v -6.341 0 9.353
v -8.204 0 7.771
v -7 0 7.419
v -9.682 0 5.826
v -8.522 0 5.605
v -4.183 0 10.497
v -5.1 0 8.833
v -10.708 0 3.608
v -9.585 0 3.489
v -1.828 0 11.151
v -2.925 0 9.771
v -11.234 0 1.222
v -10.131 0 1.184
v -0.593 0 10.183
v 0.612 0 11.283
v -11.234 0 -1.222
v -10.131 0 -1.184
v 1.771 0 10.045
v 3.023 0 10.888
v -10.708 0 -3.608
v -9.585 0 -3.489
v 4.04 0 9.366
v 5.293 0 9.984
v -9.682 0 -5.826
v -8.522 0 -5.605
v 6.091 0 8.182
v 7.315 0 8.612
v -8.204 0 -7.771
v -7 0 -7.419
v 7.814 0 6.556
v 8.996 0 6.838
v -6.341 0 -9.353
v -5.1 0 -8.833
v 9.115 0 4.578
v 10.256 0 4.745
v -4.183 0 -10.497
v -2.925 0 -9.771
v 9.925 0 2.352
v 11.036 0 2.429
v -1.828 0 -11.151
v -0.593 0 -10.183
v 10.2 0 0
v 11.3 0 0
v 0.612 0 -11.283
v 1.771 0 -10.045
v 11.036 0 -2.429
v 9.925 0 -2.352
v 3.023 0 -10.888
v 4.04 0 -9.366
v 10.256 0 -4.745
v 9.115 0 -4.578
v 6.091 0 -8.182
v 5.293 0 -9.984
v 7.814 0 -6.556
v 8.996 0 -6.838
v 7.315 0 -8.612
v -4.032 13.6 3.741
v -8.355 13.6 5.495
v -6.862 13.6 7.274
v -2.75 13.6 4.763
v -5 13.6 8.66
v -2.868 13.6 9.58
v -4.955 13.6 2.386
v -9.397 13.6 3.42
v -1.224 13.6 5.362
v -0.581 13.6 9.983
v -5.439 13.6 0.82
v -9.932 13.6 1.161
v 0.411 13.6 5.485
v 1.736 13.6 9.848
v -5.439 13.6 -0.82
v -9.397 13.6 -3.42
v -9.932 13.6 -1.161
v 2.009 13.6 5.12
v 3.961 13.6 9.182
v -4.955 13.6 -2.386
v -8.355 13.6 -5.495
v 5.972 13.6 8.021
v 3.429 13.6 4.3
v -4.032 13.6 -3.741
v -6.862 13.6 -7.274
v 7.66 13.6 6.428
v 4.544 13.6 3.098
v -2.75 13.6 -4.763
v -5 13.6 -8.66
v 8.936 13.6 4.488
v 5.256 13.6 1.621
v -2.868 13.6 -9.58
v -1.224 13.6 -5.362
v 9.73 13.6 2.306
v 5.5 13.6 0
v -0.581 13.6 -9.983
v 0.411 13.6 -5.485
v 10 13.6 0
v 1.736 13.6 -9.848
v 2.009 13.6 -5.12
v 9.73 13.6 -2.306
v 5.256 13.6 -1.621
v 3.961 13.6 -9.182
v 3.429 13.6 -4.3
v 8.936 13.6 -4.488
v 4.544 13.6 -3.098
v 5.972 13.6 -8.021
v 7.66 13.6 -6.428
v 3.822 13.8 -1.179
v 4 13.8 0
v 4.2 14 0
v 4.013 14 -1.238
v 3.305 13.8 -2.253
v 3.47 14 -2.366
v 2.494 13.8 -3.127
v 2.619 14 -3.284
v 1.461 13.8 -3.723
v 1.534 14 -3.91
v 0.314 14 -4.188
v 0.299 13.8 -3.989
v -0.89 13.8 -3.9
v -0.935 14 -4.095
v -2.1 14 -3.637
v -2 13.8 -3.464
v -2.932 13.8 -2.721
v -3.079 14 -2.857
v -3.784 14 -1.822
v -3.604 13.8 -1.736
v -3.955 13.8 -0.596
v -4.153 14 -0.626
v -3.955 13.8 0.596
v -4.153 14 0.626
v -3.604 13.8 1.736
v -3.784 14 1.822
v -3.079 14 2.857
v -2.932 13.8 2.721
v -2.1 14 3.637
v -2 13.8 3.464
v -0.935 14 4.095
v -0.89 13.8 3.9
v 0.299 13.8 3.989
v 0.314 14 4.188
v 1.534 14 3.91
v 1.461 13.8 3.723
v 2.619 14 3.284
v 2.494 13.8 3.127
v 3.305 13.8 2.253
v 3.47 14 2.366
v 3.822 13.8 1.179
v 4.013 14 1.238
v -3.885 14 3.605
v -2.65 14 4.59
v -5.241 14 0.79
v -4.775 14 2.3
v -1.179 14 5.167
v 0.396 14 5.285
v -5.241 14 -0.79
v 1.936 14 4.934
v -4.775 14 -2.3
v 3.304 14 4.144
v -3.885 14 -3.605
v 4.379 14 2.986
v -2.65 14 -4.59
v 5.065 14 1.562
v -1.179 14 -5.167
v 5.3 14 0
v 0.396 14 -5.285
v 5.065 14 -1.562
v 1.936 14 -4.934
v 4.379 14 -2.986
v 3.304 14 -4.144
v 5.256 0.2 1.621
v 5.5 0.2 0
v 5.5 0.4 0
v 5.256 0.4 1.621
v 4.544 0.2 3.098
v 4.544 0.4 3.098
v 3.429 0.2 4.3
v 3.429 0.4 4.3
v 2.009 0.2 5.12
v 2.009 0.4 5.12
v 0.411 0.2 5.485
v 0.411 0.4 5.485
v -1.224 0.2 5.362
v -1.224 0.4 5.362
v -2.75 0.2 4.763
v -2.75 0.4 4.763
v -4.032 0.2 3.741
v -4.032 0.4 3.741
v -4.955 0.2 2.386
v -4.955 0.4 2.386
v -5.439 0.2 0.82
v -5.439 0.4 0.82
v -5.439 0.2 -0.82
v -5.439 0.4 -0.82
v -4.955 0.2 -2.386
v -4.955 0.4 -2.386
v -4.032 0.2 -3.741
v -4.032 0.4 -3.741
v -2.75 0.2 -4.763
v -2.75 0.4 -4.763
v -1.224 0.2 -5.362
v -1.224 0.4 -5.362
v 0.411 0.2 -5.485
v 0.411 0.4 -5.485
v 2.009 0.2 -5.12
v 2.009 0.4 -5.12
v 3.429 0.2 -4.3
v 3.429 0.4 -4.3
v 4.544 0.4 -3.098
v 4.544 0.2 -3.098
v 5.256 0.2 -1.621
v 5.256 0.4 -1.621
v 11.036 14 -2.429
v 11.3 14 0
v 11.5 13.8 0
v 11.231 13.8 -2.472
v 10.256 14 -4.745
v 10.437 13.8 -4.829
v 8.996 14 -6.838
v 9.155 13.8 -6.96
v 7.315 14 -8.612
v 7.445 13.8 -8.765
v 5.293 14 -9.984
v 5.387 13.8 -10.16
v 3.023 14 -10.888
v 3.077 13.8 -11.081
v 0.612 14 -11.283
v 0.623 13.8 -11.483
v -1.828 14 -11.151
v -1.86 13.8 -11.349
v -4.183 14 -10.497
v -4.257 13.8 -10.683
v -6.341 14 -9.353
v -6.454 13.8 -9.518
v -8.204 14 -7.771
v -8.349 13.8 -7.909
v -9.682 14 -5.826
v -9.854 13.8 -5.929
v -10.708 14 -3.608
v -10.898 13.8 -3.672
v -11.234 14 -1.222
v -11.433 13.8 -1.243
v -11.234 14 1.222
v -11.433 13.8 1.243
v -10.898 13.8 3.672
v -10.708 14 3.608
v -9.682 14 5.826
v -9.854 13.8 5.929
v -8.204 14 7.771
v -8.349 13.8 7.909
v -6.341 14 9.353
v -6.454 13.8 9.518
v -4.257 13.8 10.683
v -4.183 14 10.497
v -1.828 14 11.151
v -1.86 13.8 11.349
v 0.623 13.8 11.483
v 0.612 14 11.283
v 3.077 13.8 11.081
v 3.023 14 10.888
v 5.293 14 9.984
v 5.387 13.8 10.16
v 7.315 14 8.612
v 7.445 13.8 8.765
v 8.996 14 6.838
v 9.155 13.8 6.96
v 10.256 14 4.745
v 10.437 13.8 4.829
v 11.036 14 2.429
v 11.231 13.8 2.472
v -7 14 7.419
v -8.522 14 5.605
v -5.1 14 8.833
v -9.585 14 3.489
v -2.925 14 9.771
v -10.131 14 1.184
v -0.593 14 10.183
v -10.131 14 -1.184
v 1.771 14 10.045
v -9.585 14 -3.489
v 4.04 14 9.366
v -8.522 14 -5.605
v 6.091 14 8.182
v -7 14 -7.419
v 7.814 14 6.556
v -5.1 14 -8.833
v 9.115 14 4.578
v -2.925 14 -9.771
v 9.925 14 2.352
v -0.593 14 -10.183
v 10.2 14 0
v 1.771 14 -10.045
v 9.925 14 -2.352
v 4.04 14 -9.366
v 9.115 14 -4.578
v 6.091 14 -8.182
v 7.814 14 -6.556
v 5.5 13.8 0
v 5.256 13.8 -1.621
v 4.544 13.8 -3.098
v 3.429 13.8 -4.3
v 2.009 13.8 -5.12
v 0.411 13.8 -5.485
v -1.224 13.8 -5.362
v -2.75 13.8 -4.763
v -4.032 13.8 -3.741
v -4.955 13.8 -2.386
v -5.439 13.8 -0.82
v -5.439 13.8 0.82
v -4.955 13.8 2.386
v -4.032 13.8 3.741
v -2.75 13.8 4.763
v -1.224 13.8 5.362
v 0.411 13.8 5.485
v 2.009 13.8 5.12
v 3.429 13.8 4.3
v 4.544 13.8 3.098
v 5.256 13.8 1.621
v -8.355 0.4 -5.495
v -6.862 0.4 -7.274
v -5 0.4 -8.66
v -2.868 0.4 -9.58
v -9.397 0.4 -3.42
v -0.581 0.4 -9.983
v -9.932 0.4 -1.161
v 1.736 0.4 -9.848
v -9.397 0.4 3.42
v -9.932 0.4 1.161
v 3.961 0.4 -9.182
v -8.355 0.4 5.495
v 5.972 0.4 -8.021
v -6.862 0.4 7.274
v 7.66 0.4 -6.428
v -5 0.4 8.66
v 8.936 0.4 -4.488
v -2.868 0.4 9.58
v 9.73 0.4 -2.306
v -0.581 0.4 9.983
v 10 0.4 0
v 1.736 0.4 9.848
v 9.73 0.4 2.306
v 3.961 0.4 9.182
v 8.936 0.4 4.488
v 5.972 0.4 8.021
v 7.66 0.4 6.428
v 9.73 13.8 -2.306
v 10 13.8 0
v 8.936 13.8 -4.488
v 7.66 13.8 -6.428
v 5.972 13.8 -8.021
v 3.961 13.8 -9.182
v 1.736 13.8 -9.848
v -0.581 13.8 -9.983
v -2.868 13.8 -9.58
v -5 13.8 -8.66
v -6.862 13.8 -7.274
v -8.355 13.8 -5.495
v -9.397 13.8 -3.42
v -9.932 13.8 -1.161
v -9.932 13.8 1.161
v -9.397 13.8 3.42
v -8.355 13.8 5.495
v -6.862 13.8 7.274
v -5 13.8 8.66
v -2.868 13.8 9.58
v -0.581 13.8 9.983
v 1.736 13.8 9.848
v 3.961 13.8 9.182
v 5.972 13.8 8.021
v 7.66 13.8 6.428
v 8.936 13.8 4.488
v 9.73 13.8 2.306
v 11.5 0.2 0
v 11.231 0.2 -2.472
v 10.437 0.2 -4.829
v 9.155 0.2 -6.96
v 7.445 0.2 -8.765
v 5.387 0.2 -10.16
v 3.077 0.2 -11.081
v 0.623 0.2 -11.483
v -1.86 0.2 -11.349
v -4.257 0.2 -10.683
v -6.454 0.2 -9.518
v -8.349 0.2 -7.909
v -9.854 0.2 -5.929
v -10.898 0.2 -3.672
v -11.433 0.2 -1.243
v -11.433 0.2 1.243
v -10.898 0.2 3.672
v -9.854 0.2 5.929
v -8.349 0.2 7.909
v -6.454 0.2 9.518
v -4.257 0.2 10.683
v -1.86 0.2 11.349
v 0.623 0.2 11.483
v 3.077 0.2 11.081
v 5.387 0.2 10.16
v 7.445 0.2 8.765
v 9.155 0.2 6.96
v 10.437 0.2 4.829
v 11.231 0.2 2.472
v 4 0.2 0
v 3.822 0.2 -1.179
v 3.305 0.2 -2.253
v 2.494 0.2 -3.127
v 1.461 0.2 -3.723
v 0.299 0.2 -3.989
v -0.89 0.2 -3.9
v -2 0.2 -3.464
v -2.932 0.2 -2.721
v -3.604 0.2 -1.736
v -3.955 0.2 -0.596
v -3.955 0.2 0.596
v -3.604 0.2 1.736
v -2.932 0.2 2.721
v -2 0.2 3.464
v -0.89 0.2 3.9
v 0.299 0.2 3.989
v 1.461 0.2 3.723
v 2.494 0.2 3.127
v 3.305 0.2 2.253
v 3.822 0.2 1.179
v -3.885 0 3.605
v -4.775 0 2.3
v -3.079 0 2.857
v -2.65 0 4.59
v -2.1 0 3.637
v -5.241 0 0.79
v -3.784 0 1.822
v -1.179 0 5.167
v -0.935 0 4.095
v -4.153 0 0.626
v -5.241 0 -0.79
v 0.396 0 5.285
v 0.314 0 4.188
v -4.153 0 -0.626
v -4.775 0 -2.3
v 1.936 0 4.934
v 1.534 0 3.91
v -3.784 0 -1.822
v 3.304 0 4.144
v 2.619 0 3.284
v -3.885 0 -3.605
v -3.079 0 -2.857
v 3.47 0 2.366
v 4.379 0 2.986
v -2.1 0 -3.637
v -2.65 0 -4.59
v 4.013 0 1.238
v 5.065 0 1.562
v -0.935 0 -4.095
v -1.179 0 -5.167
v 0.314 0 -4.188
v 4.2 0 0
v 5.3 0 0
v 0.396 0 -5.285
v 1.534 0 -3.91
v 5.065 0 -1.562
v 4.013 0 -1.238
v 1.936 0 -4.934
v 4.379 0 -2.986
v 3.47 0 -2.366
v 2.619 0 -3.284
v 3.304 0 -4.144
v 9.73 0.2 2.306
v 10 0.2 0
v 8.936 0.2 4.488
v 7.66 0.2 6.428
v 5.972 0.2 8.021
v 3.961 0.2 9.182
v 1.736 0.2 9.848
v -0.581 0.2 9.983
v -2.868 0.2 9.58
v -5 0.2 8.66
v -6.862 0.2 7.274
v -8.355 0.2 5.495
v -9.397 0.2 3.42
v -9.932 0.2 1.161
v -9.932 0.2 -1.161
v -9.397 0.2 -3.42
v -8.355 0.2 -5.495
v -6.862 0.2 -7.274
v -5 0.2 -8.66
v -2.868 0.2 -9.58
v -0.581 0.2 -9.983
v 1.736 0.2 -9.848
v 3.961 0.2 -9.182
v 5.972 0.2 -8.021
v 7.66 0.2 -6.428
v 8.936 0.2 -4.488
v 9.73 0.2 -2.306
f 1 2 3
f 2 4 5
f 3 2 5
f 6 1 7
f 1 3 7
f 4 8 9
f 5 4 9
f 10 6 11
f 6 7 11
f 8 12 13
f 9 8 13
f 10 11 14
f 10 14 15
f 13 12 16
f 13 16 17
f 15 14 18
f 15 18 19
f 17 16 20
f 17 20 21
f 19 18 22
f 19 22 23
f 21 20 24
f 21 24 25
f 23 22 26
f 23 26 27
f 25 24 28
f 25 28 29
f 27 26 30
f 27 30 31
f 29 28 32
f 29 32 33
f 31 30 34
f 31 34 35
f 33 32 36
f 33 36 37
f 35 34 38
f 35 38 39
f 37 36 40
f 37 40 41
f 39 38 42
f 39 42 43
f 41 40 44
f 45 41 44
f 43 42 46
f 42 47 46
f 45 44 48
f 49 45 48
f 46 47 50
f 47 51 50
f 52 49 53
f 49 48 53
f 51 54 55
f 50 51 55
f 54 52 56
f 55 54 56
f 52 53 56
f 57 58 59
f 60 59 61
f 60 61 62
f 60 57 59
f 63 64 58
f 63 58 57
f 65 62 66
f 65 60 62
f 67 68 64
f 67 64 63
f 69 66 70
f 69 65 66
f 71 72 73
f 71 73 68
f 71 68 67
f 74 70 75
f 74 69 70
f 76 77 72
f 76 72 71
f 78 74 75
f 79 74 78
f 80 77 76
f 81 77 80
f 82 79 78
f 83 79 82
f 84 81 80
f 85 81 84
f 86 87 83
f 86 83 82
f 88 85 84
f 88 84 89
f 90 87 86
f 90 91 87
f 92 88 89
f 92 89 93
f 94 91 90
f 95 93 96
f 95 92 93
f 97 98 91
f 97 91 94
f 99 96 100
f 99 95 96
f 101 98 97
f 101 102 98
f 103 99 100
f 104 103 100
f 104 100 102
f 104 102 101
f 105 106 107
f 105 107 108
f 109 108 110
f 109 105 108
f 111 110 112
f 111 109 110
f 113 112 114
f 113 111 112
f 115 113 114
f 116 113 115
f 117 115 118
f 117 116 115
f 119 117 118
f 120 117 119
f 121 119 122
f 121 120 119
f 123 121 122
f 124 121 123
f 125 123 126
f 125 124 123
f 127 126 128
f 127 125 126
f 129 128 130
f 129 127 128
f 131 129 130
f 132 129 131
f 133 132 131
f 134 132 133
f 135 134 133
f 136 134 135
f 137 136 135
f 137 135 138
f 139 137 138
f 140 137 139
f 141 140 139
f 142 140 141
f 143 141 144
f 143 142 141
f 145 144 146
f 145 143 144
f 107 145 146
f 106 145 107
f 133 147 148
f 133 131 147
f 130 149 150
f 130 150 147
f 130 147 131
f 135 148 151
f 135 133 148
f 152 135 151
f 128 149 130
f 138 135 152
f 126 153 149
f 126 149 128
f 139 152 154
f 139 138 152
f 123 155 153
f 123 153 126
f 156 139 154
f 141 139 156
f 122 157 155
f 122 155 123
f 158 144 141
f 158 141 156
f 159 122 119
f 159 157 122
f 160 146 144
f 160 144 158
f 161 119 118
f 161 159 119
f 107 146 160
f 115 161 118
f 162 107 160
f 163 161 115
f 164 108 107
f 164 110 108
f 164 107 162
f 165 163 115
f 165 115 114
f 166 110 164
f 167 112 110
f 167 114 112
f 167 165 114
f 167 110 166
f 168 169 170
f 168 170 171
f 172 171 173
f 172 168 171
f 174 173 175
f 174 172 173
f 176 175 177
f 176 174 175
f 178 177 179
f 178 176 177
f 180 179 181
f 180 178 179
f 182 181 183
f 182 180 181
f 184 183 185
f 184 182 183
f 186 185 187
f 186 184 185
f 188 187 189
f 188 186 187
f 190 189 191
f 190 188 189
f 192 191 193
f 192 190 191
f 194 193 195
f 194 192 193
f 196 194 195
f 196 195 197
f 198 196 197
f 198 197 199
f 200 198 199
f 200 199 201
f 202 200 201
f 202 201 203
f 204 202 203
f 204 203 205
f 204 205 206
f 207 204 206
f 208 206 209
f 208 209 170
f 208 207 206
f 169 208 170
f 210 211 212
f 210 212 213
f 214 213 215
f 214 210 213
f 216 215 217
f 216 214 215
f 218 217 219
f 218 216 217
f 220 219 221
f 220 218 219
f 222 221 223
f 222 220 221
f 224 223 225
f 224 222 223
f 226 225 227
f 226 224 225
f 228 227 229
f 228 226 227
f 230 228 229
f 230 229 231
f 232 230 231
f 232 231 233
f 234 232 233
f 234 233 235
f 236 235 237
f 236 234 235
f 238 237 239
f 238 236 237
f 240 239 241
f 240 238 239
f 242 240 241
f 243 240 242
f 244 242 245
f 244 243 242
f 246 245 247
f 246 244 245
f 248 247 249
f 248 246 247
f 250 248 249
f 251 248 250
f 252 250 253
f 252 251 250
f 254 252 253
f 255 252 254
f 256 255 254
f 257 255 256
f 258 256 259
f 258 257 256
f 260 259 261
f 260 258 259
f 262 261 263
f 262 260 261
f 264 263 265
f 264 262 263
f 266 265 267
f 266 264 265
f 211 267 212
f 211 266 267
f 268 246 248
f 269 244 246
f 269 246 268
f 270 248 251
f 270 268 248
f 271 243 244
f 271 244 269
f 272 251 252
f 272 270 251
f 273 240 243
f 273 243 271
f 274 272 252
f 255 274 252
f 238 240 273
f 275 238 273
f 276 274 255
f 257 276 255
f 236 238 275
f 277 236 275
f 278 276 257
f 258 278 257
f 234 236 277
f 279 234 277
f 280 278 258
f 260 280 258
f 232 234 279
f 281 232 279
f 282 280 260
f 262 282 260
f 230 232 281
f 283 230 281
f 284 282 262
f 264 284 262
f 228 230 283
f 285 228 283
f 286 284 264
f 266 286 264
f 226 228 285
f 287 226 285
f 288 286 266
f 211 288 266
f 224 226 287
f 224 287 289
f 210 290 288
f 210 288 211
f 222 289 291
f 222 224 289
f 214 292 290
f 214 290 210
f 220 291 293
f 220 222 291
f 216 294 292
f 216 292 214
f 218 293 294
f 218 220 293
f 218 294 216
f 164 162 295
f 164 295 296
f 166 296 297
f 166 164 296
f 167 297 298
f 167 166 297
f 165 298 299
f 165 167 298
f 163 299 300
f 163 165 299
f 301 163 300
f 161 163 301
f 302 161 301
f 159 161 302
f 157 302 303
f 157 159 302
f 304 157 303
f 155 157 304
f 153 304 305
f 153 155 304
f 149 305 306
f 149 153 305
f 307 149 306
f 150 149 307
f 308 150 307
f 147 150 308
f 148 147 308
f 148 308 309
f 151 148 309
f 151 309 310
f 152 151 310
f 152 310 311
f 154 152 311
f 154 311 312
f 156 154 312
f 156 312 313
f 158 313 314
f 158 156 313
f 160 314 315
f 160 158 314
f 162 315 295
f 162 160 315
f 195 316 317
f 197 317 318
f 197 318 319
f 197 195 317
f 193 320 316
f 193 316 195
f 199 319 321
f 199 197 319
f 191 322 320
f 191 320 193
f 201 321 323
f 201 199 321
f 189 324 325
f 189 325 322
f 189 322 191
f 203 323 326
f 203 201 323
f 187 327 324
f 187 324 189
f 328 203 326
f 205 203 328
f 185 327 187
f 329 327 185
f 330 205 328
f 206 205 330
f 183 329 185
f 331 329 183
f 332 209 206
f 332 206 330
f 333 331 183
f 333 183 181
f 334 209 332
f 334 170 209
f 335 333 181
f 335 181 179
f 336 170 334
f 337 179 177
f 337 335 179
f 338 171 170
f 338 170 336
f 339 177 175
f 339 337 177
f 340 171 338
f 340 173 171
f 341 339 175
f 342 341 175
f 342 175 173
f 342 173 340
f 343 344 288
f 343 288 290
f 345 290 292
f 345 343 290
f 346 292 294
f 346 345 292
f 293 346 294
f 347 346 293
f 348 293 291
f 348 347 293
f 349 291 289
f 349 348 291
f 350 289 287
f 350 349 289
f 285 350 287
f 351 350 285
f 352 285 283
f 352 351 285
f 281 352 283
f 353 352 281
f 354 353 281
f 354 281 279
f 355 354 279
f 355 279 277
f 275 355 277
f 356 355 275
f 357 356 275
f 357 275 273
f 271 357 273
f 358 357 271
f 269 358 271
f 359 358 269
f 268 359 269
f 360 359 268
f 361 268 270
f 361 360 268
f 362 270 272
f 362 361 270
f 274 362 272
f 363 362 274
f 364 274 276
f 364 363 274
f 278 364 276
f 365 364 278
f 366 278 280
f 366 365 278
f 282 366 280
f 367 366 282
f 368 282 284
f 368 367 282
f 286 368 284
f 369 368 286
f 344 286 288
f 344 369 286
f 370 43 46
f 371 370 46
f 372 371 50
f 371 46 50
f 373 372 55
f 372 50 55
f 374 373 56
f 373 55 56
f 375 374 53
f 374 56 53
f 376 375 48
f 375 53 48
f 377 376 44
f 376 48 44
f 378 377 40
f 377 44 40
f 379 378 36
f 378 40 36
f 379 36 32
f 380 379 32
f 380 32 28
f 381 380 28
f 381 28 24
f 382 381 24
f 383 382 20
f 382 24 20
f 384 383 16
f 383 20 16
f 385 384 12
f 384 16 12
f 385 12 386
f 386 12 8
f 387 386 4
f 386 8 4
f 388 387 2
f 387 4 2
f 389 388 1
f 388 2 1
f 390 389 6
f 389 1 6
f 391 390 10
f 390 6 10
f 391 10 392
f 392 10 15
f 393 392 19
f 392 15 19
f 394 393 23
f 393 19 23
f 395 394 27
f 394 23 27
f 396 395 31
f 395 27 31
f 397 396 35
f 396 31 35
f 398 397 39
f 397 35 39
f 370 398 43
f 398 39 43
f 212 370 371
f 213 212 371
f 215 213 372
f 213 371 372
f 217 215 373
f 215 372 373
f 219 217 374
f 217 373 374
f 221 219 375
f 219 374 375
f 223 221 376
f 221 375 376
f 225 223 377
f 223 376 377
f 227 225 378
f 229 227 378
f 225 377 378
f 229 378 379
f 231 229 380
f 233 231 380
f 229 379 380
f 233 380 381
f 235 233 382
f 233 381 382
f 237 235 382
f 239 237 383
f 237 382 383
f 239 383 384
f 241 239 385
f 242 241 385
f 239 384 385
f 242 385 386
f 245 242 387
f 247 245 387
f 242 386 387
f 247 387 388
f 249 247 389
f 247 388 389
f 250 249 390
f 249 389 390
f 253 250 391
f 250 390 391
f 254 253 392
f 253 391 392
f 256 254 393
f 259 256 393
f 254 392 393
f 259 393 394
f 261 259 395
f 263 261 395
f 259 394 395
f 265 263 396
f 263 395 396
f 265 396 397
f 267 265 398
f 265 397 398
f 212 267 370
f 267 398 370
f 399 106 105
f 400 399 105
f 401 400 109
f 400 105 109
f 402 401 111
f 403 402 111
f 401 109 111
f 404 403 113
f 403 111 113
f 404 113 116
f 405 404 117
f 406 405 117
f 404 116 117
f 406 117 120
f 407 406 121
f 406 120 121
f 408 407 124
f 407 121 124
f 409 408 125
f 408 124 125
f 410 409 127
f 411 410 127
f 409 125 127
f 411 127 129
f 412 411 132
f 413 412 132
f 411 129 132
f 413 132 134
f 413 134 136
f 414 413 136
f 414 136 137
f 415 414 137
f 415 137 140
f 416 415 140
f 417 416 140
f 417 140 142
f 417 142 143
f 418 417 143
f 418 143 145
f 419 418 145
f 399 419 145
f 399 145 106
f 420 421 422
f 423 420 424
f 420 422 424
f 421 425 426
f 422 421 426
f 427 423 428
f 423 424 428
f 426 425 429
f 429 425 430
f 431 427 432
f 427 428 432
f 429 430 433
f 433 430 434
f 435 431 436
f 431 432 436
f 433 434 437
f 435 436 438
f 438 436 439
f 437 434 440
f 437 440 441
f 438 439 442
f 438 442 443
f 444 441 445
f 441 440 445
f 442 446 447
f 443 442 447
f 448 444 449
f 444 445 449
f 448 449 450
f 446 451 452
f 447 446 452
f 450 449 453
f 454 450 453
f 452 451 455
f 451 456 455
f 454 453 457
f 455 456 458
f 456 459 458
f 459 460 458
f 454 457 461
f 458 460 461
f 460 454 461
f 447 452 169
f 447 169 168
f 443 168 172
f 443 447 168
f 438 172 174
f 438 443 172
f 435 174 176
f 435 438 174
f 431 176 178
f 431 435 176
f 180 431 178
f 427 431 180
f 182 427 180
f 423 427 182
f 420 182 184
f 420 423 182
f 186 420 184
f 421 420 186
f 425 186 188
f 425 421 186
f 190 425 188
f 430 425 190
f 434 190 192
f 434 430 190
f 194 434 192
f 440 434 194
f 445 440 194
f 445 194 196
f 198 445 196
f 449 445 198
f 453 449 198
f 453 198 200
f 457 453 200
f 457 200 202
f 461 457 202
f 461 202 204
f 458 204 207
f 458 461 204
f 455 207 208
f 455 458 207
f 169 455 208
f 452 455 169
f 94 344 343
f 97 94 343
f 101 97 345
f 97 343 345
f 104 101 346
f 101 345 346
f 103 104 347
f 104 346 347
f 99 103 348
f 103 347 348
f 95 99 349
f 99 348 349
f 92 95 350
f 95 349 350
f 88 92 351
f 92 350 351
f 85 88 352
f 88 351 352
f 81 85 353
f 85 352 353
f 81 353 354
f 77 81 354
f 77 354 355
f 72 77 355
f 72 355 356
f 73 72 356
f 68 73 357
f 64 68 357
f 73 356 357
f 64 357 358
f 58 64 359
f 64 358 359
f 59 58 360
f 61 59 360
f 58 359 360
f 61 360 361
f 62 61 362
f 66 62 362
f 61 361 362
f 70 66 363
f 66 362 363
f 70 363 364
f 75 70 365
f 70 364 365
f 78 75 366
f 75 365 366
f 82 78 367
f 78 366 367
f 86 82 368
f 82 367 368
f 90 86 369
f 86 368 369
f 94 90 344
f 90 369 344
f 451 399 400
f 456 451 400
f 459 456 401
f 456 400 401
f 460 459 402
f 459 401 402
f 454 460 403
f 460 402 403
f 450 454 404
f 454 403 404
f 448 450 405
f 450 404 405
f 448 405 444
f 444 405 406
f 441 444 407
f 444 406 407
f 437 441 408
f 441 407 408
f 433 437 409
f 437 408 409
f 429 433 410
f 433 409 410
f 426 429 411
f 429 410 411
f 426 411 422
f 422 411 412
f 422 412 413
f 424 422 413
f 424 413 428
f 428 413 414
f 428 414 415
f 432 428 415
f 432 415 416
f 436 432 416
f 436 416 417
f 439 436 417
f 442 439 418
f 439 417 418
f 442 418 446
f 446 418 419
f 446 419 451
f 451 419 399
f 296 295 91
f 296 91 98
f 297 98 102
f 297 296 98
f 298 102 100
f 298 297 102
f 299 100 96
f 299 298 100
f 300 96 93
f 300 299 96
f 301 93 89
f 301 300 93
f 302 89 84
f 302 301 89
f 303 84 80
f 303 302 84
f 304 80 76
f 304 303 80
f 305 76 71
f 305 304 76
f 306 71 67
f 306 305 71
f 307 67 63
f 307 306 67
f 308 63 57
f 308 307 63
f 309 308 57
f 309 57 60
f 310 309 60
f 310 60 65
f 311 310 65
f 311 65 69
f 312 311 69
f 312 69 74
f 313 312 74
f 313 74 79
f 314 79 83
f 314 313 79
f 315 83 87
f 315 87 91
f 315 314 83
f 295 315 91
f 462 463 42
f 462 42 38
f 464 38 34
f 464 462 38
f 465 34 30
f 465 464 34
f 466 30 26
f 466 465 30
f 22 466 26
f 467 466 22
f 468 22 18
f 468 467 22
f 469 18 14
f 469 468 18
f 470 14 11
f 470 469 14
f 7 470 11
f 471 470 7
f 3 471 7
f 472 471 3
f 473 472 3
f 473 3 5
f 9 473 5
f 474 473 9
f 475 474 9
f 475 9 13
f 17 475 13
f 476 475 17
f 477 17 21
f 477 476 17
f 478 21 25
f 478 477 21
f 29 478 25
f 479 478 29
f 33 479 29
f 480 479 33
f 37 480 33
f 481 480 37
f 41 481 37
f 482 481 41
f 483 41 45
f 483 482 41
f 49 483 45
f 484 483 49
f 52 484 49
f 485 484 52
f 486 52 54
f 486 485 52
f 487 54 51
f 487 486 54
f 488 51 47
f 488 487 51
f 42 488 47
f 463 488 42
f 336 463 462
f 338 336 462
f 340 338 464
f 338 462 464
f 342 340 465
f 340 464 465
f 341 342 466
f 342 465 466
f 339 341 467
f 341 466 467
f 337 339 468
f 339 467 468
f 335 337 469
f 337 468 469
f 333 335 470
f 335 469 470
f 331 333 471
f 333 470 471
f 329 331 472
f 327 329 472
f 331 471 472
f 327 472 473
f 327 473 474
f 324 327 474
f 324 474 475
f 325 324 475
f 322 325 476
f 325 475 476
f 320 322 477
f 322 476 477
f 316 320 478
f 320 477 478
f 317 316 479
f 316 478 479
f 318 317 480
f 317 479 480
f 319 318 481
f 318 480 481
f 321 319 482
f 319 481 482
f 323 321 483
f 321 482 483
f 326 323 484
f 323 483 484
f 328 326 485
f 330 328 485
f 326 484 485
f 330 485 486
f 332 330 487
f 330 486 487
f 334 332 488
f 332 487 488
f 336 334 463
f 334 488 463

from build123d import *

# Parameters (mm, degrees)
SKETCH_1_R          = 11.5
EXTRUDE_1_DEPTH     = 14
SKETCH_2_R          = 4
CUT_EXTRUDE_1_DEPTH = 24
SKETCH_3_R          = 10
SKETCH_3_R_2        = 5.5
CUT_EXTRUDE_2_DEPTH = 0.4
SKETCH_4_R          = 10
SKETCH_4_R_2        = 5.5
CUT_EXTRUDE_3_DEPTH = 0.4
CHAMFER_1_SIZE      = 0.2


with BuildPart() as part:
    # 草图1 → 凸台-拉伸1 (new body)
    with BuildSketch(Plane(origin=(0, 0, 0), x_dir=(1, 0, 0), z_dir=(0, 1, 0))):
        Circle(SKETCH_1_R)
    extrude(amount=EXTRUDE_1_DEPTH)

    # 草图2 → 切除-拉伸1 (cut)
    with BuildSketch(Plane(origin=(0, 14, 0), x_dir=(1, 0, 0), z_dir=(0, 1, 0))):
        Circle(SKETCH_2_R)
    extrude(amount=-CUT_EXTRUDE_1_DEPTH, mode=Mode.SUBTRACT)

    # 草图3 → 切除-拉伸2 (cut)
    with BuildSketch(Plane(origin=(0, 14, 0), x_dir=(1, 0, 0), z_dir=(0, 1, 0))):
        Circle(SKETCH_3_R)
        Circle(SKETCH_3_R_2, mode=Mode.SUBTRACT)
    extrude(amount=-CUT_EXTRUDE_2_DEPTH, mode=Mode.SUBTRACT)

    # 草图4 → 切除-拉伸3 (cut)
    with BuildSketch(Plane.XZ):
        Circle(SKETCH_4_R)
        Circle(SKETCH_4_R_2, mode=Mode.SUBTRACT)
    extrude(amount=-CUT_EXTRUDE_3_DEPTH, mode=Mode.SUBTRACT)

    # 倒角1
    chamfer_1_edges = [part.edges().sort_by_distance(p)[0] for p in [
        (-10, 14, 0),
        (-5.5, 14, 0),
        (-11.5, 0, 0),
        (-10, 0, 0),
        (-5.5, 0, 0),
        (-11.5, 14, 0),
        (-4, 0, 0),
        (-4, 14, 0),
    ]]
    chamfer(chamfer_1_edges, length=CHAMFER_1_SIZE)


solid = part.part
